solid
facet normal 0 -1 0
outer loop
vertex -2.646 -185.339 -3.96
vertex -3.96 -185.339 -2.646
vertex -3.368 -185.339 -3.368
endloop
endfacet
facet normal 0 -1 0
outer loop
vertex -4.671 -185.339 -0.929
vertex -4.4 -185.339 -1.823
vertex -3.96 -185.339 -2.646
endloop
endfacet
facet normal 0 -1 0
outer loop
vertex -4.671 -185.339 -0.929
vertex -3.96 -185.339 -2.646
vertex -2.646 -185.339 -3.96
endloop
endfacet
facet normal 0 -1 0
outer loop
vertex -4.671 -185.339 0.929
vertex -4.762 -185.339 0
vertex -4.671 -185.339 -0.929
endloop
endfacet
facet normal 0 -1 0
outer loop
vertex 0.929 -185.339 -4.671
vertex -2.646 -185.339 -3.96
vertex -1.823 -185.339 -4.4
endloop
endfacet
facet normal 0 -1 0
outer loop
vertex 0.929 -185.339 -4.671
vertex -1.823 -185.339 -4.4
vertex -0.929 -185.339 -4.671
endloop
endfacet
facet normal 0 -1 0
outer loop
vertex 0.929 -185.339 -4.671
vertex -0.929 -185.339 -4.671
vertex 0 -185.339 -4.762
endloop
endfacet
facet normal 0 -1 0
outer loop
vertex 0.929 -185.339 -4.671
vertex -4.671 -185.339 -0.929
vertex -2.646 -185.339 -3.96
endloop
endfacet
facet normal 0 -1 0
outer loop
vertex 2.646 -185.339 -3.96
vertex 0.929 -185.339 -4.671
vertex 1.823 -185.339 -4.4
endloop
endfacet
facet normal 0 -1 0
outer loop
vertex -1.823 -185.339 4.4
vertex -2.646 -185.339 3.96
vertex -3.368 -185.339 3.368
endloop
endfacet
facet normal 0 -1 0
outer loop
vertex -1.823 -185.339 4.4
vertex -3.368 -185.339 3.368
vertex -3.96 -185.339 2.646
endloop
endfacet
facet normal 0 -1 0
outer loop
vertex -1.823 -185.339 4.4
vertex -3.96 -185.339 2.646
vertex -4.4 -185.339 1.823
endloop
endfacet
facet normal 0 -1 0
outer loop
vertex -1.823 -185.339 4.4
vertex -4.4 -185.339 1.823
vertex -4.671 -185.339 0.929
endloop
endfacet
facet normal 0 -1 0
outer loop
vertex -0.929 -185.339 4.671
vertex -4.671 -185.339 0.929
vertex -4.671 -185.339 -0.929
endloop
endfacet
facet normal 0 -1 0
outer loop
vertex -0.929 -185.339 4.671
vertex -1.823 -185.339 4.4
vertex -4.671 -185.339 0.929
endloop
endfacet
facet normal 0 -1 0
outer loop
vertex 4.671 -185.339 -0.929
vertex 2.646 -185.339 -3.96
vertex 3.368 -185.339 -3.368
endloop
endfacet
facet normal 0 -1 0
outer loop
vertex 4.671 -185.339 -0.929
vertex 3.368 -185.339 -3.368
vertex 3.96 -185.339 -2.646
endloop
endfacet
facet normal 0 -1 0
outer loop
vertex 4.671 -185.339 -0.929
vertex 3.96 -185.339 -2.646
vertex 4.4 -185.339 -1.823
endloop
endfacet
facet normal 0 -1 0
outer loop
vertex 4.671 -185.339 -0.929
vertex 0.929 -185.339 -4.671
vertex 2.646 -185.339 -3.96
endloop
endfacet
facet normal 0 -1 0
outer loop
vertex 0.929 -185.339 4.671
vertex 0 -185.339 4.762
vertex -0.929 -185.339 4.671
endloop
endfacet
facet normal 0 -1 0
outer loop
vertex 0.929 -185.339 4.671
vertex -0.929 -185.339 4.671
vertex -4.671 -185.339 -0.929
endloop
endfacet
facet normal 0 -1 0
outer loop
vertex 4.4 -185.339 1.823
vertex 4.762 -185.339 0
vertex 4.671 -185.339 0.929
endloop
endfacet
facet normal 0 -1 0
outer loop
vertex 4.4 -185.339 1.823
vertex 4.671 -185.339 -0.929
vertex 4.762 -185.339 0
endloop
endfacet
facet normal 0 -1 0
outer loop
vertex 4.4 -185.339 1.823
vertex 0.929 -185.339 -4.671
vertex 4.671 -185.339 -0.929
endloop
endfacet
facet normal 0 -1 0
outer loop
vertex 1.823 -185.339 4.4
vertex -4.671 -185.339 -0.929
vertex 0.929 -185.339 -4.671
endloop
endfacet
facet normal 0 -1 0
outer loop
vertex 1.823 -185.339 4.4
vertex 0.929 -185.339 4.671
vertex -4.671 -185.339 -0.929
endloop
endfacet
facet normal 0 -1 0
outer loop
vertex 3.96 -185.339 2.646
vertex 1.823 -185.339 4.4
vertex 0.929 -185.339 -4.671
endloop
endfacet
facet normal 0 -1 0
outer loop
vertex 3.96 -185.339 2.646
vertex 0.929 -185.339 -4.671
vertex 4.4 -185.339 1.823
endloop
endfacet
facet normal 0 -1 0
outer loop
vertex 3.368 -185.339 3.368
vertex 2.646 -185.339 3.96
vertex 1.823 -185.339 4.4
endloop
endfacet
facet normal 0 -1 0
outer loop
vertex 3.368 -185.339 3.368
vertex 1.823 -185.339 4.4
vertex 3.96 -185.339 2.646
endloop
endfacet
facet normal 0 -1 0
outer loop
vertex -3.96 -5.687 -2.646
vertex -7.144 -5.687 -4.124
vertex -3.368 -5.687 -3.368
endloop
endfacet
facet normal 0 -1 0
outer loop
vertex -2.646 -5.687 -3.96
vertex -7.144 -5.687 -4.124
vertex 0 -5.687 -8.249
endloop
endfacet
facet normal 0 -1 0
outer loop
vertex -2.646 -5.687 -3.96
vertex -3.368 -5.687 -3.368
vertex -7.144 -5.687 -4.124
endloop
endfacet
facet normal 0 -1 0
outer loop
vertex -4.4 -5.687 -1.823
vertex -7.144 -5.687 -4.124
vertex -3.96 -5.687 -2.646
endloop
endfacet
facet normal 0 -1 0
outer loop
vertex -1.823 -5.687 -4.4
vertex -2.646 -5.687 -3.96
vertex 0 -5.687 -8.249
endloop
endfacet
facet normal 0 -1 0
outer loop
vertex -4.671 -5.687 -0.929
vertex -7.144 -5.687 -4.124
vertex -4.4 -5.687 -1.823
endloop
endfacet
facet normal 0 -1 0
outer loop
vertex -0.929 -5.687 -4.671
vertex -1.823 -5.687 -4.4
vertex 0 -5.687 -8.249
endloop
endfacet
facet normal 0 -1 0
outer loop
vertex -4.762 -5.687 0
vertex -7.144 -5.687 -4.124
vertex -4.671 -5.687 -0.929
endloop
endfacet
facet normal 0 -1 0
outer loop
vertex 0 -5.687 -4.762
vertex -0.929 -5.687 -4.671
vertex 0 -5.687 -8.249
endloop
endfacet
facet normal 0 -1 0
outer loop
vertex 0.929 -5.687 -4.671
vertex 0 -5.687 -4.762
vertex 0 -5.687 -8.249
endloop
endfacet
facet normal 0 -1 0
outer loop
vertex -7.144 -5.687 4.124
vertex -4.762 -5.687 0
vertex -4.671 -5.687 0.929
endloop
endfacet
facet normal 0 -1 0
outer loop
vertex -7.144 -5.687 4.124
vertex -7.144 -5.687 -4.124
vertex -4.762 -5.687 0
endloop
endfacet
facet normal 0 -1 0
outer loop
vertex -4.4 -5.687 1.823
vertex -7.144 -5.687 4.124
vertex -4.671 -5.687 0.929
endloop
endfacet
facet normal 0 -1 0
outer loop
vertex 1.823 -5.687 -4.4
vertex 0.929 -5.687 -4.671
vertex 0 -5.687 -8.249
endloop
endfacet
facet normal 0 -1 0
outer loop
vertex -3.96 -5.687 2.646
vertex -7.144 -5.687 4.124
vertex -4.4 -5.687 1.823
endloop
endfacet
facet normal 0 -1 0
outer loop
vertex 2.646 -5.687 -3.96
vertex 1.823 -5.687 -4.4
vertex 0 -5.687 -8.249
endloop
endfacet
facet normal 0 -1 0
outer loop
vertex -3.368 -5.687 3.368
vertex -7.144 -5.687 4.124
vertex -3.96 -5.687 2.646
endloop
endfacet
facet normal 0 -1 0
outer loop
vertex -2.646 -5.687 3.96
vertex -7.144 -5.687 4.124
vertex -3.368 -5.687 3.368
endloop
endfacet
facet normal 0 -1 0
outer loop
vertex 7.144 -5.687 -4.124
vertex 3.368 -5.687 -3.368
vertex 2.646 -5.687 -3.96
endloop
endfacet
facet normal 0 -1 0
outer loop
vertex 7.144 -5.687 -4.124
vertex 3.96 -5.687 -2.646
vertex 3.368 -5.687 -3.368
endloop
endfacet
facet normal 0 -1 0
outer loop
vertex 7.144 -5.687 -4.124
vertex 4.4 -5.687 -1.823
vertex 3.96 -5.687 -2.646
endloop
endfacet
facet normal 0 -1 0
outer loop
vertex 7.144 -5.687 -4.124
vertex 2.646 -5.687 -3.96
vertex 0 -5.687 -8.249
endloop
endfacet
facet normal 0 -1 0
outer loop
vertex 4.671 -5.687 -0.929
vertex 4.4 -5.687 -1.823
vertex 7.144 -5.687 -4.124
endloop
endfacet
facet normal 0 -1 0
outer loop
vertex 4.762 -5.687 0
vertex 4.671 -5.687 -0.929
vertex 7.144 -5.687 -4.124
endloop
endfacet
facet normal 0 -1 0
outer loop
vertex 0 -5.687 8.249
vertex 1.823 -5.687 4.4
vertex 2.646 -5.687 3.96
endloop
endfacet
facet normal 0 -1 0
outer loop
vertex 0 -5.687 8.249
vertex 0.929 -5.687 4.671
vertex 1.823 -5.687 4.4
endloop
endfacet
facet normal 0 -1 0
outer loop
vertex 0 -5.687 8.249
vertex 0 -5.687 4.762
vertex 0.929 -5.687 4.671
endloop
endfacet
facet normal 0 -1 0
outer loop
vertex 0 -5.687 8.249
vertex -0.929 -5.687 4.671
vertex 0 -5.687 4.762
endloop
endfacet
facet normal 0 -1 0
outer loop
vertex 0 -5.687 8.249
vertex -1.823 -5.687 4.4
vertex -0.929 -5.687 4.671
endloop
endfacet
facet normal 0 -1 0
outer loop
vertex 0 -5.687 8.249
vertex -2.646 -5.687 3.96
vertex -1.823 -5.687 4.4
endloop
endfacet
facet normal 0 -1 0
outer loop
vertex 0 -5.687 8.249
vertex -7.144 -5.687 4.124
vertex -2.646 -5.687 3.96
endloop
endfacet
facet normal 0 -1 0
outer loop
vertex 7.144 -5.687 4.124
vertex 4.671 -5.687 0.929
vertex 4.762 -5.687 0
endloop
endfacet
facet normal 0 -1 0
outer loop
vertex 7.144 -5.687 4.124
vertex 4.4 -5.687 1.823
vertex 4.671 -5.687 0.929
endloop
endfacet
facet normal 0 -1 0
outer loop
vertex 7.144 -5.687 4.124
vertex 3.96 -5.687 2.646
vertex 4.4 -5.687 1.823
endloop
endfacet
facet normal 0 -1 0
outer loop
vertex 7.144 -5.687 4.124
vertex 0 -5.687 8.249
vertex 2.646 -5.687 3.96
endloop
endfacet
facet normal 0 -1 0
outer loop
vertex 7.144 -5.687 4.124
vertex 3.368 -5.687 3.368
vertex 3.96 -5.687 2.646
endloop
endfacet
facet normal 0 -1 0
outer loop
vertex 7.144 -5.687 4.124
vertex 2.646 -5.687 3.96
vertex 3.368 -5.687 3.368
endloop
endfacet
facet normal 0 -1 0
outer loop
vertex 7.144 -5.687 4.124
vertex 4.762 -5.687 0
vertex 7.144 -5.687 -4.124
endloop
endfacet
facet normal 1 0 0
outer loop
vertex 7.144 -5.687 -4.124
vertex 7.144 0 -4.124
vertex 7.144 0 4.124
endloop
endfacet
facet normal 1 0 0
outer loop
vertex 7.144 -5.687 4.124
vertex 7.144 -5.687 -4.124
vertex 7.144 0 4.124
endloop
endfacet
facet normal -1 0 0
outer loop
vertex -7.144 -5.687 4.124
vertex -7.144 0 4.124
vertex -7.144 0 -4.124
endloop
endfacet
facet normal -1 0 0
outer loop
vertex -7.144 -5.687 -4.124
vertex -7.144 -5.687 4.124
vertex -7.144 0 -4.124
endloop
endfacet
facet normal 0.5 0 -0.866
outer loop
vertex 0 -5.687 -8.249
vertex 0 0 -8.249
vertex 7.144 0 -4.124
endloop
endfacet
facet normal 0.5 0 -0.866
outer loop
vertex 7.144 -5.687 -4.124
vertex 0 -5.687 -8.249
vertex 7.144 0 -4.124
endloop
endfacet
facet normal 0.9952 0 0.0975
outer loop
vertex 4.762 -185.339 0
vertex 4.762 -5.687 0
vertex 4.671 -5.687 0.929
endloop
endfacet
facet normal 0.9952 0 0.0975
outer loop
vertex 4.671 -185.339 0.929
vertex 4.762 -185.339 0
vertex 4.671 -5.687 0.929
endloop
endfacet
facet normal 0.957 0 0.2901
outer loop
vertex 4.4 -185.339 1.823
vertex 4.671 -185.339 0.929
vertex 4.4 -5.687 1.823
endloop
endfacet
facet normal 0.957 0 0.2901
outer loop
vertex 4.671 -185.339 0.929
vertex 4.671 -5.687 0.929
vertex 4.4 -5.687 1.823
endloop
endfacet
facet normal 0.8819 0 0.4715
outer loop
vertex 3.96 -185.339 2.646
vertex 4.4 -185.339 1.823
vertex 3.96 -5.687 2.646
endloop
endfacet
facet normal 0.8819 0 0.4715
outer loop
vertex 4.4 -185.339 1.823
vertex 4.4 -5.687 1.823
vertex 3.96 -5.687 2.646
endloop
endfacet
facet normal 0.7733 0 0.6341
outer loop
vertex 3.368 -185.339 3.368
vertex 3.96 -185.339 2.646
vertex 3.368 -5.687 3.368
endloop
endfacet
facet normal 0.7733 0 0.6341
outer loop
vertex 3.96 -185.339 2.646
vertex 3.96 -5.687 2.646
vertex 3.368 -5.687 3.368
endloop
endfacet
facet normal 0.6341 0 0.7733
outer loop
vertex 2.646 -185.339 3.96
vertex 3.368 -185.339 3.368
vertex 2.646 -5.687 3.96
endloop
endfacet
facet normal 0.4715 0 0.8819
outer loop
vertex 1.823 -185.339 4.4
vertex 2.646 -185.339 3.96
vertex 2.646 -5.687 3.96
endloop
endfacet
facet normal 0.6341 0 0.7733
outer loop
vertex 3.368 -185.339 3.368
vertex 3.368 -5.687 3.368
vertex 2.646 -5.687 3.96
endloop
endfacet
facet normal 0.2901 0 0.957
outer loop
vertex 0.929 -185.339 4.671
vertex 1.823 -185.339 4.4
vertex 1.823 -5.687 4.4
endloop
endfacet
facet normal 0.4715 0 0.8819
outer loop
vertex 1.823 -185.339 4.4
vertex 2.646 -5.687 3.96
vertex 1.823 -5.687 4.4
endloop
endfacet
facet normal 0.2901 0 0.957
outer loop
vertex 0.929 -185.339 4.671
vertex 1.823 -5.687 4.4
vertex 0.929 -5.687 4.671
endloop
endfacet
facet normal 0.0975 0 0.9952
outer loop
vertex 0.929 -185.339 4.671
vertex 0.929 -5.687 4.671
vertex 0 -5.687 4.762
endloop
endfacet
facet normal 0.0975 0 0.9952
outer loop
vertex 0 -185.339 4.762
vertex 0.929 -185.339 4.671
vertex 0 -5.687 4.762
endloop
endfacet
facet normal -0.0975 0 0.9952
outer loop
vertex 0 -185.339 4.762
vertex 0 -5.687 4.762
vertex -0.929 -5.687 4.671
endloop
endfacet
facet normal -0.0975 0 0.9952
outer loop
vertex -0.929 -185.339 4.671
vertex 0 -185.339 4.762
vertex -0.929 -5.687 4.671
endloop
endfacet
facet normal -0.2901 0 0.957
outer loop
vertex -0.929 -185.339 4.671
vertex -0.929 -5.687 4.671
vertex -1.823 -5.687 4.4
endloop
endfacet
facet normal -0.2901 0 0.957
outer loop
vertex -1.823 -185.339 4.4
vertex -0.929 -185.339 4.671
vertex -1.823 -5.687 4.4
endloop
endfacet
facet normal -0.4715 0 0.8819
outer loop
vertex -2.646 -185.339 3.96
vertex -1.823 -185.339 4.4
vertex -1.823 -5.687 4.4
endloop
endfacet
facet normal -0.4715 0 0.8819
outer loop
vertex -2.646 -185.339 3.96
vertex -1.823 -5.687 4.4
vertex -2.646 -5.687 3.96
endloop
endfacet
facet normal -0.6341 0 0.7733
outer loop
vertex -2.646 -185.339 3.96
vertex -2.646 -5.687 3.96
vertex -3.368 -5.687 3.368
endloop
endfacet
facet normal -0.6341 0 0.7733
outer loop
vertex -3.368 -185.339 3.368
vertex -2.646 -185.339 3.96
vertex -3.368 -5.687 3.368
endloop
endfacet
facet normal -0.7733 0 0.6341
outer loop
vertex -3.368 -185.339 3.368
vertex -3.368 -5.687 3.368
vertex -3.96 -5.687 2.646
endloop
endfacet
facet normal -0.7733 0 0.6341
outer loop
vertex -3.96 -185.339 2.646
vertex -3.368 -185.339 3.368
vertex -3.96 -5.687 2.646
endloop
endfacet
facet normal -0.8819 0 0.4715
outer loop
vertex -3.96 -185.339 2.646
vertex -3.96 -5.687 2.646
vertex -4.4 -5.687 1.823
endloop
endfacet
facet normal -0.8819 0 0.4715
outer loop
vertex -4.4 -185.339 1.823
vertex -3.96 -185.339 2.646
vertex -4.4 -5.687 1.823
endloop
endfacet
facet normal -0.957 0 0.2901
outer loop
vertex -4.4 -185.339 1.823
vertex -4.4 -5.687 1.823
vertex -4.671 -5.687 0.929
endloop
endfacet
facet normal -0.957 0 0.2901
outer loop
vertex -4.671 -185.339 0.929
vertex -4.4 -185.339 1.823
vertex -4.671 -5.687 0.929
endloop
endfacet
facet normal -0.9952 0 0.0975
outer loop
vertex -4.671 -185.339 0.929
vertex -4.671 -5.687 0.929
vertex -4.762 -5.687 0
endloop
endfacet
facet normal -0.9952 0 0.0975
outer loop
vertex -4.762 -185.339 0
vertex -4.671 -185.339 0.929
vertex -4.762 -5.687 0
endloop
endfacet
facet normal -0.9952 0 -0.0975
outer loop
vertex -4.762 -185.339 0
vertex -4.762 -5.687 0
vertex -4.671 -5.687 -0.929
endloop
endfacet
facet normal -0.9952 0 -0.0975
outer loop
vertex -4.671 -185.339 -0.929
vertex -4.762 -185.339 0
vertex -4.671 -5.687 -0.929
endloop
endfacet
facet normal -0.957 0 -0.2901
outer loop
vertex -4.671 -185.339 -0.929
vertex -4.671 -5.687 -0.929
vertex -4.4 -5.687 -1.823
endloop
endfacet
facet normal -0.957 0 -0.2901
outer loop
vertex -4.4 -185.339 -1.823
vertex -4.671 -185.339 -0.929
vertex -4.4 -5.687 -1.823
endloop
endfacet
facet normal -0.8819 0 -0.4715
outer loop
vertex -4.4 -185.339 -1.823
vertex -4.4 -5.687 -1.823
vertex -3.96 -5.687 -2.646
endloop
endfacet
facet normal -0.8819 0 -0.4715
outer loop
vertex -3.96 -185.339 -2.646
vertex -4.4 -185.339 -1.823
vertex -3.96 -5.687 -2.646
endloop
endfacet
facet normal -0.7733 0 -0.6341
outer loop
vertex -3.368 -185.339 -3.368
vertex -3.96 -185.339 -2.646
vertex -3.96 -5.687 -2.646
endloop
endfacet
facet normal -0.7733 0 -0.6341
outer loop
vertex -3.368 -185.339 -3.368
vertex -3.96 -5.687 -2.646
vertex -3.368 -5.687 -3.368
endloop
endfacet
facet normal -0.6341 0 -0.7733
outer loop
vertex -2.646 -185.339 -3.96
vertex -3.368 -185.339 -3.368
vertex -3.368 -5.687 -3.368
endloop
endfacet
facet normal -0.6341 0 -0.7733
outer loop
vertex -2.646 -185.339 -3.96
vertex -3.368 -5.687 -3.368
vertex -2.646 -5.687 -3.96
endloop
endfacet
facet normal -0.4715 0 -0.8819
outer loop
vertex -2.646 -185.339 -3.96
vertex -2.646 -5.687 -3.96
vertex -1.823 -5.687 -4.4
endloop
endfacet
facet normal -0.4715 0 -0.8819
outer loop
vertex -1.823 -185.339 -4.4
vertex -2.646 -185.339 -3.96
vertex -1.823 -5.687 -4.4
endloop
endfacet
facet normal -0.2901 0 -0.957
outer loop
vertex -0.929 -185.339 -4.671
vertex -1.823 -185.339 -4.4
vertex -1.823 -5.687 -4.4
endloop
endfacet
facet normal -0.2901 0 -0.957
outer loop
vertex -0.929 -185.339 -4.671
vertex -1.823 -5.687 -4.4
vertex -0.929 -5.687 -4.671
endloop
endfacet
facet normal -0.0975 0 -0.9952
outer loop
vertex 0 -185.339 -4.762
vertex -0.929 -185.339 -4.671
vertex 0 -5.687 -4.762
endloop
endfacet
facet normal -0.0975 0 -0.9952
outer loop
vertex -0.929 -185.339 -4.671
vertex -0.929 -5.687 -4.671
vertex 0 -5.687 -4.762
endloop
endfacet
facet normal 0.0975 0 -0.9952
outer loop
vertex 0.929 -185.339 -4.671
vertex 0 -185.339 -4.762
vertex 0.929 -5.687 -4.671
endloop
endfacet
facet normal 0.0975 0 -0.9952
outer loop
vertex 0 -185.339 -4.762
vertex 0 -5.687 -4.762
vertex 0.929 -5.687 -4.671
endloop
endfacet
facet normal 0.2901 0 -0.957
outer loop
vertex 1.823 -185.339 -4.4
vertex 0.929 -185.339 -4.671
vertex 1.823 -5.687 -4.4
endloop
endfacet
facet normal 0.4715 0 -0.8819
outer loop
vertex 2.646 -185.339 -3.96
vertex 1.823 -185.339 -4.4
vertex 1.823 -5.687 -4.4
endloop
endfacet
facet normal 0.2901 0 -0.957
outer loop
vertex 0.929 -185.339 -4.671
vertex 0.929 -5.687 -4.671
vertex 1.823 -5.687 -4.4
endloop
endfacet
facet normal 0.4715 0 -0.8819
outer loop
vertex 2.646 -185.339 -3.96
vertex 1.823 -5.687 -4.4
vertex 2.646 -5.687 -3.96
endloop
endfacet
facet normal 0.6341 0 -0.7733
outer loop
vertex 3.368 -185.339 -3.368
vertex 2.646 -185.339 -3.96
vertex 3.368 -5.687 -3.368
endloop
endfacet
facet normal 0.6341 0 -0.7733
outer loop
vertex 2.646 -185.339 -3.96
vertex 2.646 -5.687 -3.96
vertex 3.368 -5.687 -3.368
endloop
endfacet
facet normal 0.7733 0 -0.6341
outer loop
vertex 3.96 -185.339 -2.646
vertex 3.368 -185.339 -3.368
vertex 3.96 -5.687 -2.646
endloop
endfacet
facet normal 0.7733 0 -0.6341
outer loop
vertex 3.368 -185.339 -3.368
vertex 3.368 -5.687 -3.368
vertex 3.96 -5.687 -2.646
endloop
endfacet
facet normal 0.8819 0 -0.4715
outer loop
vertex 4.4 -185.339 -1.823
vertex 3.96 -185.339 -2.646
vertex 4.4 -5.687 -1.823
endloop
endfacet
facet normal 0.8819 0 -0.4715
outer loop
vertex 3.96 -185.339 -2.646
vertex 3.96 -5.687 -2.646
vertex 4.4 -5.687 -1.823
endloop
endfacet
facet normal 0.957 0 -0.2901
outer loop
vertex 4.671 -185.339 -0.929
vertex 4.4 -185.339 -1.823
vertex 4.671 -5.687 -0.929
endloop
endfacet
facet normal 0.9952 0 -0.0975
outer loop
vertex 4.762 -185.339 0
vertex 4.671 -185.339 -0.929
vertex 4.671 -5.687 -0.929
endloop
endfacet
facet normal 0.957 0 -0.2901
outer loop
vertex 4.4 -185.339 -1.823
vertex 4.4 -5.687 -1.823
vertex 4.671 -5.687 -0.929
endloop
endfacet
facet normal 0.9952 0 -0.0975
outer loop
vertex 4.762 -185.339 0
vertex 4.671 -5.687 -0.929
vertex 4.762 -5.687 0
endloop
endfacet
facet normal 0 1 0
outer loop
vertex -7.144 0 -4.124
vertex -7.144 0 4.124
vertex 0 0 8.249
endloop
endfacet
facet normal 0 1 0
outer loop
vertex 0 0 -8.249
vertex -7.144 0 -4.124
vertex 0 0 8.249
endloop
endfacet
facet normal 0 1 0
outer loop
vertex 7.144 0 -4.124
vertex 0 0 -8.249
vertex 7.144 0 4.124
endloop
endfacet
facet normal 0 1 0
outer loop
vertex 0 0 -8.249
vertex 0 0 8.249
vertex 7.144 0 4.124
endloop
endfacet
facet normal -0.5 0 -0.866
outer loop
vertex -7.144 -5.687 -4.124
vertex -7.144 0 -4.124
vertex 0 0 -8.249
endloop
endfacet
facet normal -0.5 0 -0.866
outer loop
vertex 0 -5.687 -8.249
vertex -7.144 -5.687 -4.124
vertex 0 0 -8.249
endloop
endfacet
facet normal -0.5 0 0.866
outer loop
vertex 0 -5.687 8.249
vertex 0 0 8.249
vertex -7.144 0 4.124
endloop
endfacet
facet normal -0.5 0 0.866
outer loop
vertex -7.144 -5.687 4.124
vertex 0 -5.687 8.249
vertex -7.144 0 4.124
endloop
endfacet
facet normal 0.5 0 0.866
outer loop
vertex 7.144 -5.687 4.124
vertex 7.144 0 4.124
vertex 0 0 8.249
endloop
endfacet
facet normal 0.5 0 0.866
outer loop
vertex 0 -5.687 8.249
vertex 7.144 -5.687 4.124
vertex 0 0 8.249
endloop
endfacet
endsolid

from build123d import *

# Parameters (mm, degrees)
F0_R     = 4.7625
F1_DEPTH = 185.33872
F2_DEPTH = 5.6865671642


# Not quite as in the source:
# - a length typed as a fraction of an inch, garbled in the dataset ("3 / 203.2 mm" for 3/8 in), is restored


with BuildPart() as f1:
    # F0 (on Front) → F1 (new body)
    with BuildSketch(Plane.XZ):
        Circle(F0_R)
    extrude(amount=F1_DEPTH)

    # F0 (on Front) → F2 (join)
    with BuildSketch(Plane.XZ):
        Polygon((7.14375, -4.1244459855), (7.14375, 4.1244459855), (0, 8.248891971), (-7.14375, 4.1244459855), (-7.14375, -4.1244459855), (0, -8.248891971), align=None)
        Circle(F0_R, mode=Mode.SUBTRACT)
    extrude(amount=F2_DEPTH)


solid = f1.part
